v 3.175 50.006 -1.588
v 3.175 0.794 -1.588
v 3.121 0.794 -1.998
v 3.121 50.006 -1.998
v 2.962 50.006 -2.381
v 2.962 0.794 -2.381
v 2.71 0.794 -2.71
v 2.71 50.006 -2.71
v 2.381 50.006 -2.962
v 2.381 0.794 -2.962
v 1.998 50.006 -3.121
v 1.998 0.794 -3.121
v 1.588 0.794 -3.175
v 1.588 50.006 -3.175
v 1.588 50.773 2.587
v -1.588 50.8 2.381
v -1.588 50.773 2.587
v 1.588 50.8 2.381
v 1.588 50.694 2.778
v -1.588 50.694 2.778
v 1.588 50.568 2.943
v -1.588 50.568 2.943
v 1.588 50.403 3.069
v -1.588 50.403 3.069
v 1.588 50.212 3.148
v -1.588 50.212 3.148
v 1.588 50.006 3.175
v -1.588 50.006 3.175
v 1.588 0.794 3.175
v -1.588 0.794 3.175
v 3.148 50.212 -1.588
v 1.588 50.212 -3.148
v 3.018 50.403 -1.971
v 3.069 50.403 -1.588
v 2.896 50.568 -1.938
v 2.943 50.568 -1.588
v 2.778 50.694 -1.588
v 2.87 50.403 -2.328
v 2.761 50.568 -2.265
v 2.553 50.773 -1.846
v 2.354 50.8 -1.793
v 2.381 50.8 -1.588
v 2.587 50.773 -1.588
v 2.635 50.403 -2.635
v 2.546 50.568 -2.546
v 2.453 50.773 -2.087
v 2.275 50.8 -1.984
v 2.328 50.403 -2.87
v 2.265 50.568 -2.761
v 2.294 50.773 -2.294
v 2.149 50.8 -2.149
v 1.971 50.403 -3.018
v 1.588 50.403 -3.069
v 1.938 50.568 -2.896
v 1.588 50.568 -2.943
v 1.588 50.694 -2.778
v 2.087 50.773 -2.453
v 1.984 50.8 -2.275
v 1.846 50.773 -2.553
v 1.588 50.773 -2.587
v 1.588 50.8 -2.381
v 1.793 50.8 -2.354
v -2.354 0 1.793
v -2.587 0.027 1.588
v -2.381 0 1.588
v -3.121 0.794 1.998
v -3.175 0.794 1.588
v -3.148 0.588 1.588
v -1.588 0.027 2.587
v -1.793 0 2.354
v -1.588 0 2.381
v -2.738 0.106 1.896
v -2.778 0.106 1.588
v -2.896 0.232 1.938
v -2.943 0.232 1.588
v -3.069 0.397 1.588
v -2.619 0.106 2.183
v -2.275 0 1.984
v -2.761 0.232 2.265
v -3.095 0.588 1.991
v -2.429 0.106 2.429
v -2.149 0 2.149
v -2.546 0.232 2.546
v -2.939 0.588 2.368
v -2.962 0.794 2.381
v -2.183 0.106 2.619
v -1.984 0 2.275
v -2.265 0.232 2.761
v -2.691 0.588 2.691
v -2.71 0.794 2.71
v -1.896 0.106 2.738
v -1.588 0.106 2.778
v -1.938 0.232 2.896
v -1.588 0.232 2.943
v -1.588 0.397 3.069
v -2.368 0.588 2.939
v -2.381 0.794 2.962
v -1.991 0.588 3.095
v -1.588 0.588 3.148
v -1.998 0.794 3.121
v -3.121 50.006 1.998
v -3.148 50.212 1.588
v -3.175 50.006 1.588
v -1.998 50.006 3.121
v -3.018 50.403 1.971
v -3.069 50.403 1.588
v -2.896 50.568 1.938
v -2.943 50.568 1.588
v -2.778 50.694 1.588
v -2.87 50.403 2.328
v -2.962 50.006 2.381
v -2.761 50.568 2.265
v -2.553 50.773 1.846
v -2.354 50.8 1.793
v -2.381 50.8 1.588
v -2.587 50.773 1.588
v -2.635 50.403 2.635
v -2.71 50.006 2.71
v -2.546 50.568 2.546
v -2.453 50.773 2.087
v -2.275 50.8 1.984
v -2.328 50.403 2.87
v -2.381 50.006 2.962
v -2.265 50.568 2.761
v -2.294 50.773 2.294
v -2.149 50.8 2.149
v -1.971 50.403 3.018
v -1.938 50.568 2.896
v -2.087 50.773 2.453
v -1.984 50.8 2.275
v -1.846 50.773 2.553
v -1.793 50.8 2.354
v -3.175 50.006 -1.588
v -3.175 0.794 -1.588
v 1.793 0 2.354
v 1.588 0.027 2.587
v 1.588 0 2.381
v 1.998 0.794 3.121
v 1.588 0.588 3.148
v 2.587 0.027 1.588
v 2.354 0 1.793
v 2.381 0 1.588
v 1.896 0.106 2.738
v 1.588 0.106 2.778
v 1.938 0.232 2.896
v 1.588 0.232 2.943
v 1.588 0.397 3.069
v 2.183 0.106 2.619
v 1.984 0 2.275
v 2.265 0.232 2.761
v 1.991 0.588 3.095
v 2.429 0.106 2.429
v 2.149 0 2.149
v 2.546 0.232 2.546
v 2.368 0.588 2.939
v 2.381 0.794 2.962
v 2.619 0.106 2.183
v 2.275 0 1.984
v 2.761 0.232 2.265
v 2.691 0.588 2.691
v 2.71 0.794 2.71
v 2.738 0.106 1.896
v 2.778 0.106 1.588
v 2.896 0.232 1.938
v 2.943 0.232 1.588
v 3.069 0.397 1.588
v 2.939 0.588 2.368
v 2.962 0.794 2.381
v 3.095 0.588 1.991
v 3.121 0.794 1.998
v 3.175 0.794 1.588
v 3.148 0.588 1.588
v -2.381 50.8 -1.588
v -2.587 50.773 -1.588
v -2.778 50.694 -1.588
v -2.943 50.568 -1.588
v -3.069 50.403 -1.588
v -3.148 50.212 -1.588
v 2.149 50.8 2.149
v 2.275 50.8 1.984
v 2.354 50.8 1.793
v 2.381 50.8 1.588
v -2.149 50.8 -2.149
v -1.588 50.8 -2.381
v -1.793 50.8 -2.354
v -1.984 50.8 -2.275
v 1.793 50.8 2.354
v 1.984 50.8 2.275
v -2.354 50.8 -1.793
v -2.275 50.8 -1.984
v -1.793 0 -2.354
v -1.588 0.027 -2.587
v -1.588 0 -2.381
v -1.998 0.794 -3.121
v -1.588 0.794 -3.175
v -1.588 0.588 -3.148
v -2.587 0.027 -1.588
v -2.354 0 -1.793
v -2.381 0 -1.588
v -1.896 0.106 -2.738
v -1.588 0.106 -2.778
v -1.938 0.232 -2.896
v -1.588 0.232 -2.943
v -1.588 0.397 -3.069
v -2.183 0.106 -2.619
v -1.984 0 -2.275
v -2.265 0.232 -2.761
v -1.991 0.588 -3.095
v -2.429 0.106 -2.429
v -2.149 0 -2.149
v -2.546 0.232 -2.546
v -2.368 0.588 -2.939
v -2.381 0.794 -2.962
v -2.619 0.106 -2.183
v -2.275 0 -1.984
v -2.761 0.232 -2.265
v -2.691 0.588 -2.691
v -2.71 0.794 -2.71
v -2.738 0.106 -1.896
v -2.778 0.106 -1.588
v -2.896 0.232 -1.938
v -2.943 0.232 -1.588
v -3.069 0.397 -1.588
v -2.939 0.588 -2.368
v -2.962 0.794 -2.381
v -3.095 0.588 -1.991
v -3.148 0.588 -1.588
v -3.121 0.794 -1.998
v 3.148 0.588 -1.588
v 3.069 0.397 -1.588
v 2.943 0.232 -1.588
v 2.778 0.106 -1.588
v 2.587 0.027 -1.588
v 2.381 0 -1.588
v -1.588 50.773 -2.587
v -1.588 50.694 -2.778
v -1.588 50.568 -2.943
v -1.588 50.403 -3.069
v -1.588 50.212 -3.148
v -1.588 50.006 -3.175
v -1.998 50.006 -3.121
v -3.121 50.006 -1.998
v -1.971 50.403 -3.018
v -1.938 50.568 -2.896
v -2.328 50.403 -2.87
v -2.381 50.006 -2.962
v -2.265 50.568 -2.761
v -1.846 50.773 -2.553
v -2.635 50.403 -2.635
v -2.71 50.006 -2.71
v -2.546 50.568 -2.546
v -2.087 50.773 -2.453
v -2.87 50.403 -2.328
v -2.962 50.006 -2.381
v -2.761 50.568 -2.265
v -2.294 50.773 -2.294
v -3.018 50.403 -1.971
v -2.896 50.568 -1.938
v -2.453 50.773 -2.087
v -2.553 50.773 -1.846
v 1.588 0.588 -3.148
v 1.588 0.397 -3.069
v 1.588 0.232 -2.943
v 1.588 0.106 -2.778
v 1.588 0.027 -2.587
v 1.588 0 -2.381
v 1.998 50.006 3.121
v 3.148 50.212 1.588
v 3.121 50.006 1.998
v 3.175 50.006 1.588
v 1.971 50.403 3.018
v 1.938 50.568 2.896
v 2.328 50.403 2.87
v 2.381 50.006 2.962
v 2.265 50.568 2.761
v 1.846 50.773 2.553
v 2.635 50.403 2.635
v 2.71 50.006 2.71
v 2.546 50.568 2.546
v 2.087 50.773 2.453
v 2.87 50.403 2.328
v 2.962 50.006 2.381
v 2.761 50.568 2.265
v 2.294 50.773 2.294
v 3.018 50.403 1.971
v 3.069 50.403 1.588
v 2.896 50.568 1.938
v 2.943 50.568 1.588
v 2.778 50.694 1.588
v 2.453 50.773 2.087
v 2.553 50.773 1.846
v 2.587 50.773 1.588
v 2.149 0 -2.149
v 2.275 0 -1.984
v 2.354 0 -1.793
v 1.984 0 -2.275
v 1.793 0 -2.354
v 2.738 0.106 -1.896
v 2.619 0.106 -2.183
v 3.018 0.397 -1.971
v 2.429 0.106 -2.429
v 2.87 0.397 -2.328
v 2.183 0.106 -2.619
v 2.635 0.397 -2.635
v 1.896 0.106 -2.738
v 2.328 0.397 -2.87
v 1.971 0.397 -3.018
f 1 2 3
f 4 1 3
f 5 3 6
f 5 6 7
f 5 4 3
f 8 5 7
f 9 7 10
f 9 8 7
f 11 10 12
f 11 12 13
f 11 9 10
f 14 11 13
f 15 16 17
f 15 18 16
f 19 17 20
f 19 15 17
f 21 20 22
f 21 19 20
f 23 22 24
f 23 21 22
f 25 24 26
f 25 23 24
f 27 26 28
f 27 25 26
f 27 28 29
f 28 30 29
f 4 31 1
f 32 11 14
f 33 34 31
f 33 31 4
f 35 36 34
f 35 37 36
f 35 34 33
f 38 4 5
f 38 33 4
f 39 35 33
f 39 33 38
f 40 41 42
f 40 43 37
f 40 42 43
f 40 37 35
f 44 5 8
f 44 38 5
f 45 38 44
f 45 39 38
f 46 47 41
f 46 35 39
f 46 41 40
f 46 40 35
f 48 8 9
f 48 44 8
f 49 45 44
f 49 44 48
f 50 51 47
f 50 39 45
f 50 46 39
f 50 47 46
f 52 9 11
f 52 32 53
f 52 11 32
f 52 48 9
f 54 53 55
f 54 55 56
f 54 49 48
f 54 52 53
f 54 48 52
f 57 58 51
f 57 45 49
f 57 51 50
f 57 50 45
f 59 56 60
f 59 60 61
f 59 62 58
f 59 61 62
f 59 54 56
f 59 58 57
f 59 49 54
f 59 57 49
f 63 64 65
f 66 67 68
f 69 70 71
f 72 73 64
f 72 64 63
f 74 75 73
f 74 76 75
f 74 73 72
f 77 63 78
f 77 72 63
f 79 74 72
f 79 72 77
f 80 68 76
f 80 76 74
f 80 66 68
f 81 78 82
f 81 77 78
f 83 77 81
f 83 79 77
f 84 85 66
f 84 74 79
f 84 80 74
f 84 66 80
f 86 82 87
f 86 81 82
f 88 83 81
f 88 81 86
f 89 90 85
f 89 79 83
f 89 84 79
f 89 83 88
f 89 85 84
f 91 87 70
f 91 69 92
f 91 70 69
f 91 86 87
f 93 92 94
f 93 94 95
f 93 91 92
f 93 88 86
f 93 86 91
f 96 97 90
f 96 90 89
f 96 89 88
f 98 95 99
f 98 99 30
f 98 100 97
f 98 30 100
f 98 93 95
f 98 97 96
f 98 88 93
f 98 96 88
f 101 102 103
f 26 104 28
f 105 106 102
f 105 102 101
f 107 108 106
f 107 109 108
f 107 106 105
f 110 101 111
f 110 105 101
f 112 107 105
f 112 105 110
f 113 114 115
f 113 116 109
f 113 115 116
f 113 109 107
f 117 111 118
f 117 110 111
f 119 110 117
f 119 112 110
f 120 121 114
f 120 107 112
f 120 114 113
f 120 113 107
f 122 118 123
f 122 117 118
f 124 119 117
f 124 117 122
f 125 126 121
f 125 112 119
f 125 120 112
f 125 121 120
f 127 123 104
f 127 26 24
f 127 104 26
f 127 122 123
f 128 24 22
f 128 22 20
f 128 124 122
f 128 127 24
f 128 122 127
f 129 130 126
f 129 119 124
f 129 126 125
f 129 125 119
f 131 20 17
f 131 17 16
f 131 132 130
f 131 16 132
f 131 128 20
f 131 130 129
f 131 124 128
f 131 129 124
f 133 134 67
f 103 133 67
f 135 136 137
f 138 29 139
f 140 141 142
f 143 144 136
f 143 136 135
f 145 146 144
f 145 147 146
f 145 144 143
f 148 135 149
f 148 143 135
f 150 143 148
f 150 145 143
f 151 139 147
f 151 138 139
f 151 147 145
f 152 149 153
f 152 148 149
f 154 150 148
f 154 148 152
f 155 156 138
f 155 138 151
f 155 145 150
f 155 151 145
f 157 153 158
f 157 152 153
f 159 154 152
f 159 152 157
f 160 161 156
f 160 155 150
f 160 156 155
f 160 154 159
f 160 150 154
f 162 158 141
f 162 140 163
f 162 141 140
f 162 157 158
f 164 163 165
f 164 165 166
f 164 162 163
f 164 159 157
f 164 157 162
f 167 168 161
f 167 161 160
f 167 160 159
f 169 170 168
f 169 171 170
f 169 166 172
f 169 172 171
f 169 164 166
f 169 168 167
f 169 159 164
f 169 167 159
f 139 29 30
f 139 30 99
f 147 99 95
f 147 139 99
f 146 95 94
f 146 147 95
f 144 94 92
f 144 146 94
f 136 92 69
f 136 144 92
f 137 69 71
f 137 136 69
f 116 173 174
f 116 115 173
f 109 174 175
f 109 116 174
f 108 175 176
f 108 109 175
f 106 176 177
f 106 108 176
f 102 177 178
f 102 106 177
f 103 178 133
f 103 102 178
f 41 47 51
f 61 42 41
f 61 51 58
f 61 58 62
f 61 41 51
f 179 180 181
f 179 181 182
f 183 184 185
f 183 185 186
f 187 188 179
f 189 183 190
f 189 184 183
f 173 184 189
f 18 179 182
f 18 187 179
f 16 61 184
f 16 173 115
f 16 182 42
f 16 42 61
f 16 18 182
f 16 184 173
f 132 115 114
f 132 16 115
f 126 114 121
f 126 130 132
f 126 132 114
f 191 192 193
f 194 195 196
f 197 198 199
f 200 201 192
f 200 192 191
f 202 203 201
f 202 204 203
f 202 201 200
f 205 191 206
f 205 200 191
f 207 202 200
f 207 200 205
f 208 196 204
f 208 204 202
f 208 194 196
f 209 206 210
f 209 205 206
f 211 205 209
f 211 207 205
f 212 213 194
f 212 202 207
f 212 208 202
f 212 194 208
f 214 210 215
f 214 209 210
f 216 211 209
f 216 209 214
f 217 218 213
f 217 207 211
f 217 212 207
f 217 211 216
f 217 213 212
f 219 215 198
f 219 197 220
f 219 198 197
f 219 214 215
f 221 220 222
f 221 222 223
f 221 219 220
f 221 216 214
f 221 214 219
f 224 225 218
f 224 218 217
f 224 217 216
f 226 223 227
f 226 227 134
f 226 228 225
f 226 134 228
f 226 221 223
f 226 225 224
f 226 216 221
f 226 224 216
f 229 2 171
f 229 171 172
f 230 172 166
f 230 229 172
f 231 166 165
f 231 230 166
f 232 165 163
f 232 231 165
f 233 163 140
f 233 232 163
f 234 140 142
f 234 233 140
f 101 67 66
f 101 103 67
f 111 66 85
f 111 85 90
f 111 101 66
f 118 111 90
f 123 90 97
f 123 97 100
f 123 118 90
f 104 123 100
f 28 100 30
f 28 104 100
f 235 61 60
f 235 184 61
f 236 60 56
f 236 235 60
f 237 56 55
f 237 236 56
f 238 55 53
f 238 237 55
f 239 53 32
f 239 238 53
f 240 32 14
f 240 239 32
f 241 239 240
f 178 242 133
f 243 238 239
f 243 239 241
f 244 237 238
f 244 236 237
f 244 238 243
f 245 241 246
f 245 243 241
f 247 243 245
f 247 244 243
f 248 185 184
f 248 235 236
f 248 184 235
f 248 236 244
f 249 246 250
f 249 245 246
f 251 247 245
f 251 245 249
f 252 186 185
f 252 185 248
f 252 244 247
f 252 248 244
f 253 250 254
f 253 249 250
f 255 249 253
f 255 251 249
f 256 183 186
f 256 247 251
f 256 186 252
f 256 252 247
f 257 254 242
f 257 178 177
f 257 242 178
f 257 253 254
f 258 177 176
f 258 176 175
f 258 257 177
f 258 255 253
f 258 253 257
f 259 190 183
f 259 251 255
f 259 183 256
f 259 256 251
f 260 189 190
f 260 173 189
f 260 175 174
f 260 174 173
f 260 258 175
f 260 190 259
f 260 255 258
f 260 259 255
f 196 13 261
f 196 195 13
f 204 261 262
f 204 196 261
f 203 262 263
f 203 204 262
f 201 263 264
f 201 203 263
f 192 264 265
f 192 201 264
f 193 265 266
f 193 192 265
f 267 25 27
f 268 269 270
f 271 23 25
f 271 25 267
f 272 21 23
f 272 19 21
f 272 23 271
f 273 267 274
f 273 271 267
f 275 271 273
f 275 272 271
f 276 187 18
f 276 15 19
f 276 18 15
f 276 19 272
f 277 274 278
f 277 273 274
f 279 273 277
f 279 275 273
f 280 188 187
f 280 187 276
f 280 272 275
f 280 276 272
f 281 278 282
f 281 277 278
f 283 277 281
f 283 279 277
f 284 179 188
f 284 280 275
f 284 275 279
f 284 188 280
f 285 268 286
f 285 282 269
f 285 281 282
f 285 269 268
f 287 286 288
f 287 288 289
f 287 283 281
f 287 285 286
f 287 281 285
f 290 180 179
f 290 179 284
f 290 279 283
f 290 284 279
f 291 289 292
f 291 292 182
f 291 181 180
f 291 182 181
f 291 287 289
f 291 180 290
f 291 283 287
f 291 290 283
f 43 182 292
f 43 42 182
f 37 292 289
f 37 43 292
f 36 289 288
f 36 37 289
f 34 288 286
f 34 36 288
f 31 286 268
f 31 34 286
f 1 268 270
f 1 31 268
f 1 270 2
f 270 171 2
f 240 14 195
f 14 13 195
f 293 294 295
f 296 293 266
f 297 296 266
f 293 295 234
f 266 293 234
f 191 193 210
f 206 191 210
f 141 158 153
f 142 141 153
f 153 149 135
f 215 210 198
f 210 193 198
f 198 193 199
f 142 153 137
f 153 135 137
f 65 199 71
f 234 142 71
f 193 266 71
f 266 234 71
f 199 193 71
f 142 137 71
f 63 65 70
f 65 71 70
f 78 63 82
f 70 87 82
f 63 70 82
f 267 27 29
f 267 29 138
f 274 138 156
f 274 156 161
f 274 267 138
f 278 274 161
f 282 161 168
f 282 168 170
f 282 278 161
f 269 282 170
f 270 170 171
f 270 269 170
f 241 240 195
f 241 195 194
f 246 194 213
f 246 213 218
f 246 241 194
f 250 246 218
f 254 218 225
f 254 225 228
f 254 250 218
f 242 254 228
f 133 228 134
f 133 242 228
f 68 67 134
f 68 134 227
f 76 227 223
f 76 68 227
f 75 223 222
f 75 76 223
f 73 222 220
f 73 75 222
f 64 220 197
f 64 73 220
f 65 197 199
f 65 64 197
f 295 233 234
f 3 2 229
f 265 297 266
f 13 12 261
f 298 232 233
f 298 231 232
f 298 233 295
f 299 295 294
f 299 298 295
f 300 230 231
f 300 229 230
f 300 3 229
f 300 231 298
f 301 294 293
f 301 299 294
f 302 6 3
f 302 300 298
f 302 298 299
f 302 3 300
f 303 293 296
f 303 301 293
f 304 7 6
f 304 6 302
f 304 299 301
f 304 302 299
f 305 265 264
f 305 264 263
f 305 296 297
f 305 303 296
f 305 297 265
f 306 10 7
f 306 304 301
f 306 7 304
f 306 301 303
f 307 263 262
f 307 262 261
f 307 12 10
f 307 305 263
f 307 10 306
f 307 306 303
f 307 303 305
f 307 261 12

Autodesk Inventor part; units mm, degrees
ref_plane "YZ Plane" through (0, 0, 0) normal (1, 0, 0) x (0, 1, 0)
ref_plane "XZ Plane" through (0, 0, 0) normal (0, 1, 0) x (-1, 0, 0)
ref_plane "XY Plane" through (0, 0, 0) normal (0, 0, 1) x (1, 0, 0)
sketch "Sketch1" plane through (0, 0, 0) normal (0, 1, 0) x (-1, 0, 0)
  line L0 (-3.175, -3.175) -> (3.175, -3.175)
  line L1 (3.175, -3.175) -> (3.175, 3.175)
  line L2 (3.175, 3.175) -> (-3.175, 3.175)
  line L3 (-3.175, 3.175) -> (-3.175, -3.175)
  line L4 (-3.175, -3.175) -> (3.175, 3.175) construction
  line L5 (3.175, -3.175) -> (-3.175, 3.175) construction
  point P0 (0, 0)
  dimension "d0" = 6.35
  dimension "d1" = 6.35
extrude "Extrusion1" add sketch "Sketch1" along normal blind 50.8
fillet "Fillet1" radius 1.5875 4 edges at (3.175, 25.4, -3.175) (3.175, 25.4, 3.175) (-3.175, 25.4, -3.175) (-3.175, 25.4, 3.175)
fillet "Fillet2" radius 0.7937 16 edges at (2.71, 0, -2.71) (0, 0, -3.175) (-2.71, 0, -2.71) (-3.175, 0, 0) (-2.71, 0, 2.71) (0, 0, 3.175) (2.71, 0, 2.71) (3.175, 0, 0) (2.71, 50.8, -2.71) (0, 50.8, -3.175) (-2.71, 50.8, -2.71) (-3.175, 50.8, 0) (-2.71, 50.8, 2.71) (0, 50.8, 3.175) (2.71, 50.8, 2.71) (3.175, 50.8, 0)
properties part number "2 inch" material "Stainless Steel"
